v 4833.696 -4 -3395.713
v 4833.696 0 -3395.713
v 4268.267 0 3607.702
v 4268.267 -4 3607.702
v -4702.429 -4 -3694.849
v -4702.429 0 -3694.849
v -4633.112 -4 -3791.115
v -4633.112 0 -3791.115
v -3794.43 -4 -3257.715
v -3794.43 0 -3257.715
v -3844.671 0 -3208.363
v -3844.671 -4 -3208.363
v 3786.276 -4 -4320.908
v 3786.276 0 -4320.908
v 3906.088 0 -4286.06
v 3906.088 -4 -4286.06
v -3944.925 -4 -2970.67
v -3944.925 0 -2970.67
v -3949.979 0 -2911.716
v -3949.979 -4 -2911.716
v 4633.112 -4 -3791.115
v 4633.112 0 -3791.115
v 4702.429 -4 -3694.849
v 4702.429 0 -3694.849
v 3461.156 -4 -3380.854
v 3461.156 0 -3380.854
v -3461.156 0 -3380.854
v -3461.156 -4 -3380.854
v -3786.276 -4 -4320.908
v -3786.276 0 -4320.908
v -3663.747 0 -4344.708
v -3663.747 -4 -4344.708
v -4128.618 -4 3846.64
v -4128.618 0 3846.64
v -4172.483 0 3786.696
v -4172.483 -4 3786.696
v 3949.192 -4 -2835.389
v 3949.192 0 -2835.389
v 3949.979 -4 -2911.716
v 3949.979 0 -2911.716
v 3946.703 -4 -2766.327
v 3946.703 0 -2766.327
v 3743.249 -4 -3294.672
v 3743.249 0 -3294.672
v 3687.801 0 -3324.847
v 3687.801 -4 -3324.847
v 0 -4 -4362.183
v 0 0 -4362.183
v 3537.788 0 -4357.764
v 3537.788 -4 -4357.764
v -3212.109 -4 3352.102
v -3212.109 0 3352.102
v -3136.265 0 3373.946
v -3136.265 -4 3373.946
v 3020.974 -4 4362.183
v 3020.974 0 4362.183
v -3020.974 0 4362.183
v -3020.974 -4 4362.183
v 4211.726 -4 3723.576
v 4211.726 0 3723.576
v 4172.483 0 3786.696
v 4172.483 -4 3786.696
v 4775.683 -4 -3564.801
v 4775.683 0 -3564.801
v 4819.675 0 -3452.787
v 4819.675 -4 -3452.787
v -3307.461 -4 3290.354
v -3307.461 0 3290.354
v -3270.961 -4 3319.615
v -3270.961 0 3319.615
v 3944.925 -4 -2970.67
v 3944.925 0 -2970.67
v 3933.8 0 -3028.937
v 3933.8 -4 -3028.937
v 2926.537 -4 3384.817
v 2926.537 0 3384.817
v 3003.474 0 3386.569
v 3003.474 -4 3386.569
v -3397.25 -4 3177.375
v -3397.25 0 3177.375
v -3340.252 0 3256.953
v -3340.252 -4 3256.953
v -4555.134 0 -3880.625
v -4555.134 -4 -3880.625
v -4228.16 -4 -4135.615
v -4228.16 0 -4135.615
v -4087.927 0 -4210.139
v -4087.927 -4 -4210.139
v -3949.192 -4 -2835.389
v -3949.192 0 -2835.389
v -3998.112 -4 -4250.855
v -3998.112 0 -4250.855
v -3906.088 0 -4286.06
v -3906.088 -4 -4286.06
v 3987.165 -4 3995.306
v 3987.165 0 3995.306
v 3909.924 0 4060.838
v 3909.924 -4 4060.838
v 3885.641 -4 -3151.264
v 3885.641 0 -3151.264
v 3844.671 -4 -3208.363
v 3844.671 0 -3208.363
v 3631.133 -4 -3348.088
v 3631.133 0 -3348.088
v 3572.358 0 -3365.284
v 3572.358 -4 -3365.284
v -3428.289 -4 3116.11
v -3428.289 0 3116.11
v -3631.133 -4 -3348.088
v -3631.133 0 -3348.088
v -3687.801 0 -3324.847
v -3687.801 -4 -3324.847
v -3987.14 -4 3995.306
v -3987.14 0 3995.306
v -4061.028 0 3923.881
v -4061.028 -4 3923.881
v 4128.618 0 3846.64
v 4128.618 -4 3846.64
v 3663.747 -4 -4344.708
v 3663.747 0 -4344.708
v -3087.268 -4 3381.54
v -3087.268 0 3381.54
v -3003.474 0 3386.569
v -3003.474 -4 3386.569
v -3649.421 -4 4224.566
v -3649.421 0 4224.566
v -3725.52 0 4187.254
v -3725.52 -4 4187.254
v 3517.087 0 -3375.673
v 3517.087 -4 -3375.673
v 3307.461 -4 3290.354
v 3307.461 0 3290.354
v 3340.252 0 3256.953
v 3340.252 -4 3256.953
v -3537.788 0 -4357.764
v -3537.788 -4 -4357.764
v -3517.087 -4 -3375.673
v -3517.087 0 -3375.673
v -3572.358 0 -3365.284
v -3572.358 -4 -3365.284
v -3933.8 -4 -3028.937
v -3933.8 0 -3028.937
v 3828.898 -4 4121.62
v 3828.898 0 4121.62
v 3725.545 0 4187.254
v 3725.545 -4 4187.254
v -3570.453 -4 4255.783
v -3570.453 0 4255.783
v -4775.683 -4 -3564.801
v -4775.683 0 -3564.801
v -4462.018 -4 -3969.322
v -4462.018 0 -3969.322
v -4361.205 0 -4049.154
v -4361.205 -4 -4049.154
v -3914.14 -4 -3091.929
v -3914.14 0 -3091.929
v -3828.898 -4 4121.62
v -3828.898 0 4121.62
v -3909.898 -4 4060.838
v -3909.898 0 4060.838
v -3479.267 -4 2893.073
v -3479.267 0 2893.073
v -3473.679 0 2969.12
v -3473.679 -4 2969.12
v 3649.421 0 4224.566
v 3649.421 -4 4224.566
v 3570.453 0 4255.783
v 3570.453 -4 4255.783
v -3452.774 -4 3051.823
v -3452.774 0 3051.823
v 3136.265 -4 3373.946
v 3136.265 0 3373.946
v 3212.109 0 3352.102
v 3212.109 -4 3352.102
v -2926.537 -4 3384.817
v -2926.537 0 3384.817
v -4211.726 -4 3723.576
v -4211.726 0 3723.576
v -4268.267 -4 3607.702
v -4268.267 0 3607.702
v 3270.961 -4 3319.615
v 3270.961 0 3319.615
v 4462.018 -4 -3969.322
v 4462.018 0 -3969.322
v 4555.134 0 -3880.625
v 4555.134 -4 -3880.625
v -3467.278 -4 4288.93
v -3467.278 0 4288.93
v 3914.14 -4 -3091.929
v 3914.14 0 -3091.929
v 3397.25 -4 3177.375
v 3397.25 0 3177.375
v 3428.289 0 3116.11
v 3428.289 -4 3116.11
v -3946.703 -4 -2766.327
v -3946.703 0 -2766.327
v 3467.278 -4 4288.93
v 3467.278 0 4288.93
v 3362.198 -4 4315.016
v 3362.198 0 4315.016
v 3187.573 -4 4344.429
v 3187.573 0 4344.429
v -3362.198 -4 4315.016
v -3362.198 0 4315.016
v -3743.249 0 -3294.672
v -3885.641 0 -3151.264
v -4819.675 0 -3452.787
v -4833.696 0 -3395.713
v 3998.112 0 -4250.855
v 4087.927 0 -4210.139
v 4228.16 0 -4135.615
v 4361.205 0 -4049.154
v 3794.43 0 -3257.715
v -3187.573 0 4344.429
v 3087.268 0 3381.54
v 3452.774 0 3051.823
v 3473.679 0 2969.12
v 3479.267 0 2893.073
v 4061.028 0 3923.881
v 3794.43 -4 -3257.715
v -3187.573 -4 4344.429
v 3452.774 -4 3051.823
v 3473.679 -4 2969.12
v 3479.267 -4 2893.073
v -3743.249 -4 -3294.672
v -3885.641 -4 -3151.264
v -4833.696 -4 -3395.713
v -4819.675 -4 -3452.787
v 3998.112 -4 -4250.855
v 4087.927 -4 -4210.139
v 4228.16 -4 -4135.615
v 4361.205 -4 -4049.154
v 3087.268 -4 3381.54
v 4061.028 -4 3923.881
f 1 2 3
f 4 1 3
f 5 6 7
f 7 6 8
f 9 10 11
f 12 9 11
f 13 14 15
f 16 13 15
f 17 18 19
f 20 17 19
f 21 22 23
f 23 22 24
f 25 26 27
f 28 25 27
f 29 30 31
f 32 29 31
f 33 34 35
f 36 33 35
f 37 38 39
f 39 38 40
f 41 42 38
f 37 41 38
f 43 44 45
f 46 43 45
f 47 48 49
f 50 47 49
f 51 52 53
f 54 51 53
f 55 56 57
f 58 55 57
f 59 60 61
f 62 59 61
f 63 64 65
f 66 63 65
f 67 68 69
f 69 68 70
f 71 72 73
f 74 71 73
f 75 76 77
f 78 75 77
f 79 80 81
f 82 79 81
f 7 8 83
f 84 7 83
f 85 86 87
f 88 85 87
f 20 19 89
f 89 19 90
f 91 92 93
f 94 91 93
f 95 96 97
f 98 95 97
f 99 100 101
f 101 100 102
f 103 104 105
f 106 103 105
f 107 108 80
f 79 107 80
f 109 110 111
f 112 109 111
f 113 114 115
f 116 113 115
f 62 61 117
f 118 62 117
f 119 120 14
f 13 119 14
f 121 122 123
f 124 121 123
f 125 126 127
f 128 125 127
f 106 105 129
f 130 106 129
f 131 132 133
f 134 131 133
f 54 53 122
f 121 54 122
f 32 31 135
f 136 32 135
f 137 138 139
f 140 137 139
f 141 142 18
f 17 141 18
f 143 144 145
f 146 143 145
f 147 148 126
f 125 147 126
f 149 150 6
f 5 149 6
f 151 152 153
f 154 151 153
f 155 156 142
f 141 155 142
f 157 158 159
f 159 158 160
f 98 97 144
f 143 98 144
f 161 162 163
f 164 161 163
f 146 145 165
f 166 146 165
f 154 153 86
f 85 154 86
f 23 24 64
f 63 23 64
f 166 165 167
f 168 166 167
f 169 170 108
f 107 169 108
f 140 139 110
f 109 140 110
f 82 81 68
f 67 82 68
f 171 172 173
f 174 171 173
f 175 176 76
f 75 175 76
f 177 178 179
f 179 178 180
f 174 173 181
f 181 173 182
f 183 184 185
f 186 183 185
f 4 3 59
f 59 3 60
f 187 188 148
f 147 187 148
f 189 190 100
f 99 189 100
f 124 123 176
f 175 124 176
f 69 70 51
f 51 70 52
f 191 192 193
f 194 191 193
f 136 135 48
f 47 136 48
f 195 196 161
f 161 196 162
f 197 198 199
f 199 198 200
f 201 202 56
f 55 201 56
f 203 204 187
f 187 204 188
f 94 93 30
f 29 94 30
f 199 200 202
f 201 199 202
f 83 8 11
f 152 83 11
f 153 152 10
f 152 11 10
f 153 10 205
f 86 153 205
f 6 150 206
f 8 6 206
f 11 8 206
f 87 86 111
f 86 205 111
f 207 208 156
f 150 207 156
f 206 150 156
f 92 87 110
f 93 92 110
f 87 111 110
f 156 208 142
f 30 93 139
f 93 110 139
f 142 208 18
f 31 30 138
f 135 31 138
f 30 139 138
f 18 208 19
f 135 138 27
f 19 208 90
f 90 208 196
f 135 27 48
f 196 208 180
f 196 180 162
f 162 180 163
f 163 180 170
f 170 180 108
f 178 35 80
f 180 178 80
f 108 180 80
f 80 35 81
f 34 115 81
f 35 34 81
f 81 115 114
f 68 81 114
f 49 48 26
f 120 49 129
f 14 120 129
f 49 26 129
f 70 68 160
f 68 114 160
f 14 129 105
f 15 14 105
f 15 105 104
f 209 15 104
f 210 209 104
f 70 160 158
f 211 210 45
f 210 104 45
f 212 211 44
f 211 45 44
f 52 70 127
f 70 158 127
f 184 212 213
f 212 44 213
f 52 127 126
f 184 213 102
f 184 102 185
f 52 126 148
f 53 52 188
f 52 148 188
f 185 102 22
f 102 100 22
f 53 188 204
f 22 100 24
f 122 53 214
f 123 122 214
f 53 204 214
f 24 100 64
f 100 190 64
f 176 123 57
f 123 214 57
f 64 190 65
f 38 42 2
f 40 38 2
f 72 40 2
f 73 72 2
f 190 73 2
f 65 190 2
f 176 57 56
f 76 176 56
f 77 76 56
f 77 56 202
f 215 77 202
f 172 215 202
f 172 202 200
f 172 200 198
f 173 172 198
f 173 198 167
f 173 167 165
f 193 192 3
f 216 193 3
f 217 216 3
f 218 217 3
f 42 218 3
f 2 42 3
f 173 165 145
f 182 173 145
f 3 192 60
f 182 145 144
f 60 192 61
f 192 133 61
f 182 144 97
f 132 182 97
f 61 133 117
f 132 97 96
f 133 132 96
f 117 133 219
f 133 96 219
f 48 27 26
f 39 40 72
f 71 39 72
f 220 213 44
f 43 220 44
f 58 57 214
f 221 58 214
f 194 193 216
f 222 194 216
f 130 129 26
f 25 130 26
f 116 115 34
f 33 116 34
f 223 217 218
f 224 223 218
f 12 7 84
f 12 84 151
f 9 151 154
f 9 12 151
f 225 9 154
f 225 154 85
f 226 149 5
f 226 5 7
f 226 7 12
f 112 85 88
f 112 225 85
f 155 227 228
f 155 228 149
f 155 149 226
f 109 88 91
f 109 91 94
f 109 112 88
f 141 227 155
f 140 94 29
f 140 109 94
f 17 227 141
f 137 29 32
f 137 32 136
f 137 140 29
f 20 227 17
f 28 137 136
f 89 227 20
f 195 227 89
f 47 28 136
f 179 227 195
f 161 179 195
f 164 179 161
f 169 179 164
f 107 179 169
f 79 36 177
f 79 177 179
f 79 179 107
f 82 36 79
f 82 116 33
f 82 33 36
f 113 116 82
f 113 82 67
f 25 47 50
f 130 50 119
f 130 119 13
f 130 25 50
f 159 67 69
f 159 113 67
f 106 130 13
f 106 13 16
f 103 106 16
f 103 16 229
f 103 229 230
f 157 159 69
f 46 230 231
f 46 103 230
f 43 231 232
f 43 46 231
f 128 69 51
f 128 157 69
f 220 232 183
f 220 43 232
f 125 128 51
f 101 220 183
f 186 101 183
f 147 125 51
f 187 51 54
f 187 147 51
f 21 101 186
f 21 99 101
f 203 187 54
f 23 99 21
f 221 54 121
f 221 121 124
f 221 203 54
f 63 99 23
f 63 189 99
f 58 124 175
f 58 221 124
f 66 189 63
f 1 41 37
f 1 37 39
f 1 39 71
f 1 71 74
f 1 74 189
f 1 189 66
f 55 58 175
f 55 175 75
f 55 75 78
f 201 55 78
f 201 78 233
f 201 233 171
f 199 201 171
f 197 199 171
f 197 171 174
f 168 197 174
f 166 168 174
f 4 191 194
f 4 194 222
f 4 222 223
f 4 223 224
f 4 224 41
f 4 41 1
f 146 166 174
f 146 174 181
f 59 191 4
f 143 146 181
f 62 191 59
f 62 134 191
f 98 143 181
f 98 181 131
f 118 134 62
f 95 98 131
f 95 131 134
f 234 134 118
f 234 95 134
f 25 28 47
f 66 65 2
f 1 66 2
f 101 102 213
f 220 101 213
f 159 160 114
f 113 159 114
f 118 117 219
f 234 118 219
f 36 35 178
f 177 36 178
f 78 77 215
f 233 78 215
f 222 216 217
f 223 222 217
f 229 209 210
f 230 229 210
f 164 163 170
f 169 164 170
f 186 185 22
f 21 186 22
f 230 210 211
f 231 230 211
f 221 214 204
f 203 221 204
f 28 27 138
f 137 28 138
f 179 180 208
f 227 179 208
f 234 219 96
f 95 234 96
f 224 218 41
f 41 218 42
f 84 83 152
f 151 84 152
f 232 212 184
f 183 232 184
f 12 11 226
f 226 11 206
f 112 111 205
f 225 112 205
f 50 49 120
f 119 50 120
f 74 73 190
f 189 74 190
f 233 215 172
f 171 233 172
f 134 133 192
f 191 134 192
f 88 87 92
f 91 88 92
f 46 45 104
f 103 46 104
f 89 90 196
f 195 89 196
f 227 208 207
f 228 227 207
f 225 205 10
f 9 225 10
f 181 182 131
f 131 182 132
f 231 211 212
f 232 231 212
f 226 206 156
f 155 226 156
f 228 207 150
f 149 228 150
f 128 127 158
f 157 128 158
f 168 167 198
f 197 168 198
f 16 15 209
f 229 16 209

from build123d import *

# Parameters (mm, degrees)
F1_DEPTH = 4


with BuildPart() as f1:
    # F0 (on Front) → F1 (new body)
    with BuildSketch(Plane.XZ):
        Polygon((1097.0768, 3384.8167), (0, 3384.8167), (-1097.0768, 3384.8167), (-2926.5372, 3384.8167), (-3003.4738, 3386.5693), (-3087.2684, 3381.5401), (-3136.265, 3373.9455), (-3212.1094, 3352.1015), (-3270.9612, 3319.6149), (-3307.461, 3290.3541), (-3340.2524, 3256.9531), (-3397.25, 3177.3749), (-3428.2888, 3116.1101), (-3452.7744, 3051.8227), (-3473.6786, 2969.1203), (-3479.2666, 2893.0727), (-3946.7028, -2766.3267), (-3949.192, -2835.3893), (-3949.9794, -2911.7163), (-3944.9248, -2970.6697), (-3933.7996, -3028.9373), (-3914.14, -3091.9293), (-3885.6412, -3151.2637), (-3844.671, -3208.3629), (-3794.4298, -3257.7151), (-3743.2488, -3294.6721), (-3687.8006, -3324.8473), (-3631.1332, -3348.0883), (-3572.3576, -3365.2841), (-3517.0872, -3375.6727), (-3461.1564, -3380.8543), (0, -3380.8543), (3461.1564, -3380.8543), (3517.0872, -3375.6727), (3572.3576, -3365.2841), (3631.1332, -3348.0883), (3687.8006, -3324.8473), (3743.2488, -3294.6721), (3794.4298, -3257.7151), (3844.671, -3208.3629), (3885.6412, -3151.2637), (3914.14, -3091.9293), (3933.7996, -3028.9373), (3944.9248, -2970.6697), (3949.9794, -2911.7163), (3949.192, -2835.3893), (3946.7028, -2766.3267), (3479.2666, 2893.0727), (3473.6786, 2969.1203), (3452.7744, 3051.8227), (3428.2888, 3116.1101), (3397.25, 3177.3749), (3340.2524, 3256.9531), (3307.461, 3290.3541), (3270.9612, 3319.6149), (3212.1094, 3352.1015), (3136.265, 3373.9455), (3087.2684, 3381.5401), (3003.4738, 3386.5693), (2926.5372, 3384.8167), align=None)
        Polygon((1600.5556, 4362.1833), (0, 4362.1833), (-1600.5556, 4362.1833), (-3020.9744, 4362.1833), (-3187.573, 4344.4287), (-3362.198, 4315.0155), (-3467.2778, 4288.9297), (-3570.4526, 4255.7827), (-3649.4212, 4224.5661), (-3725.5196, 4187.2535), (-3828.8976, 4121.6199), (-3909.8982, 4060.8377), (-3987.1396, 3995.3057), (-4061.0282, 3923.8809), (-4128.6176, 3846.6395), (-4172.4834, 3786.6955), (-4211.7264, 3723.5765), (-4268.2668, 3607.7017), (-4833.6962, -3395.7133), (-4819.6754, -3452.7871), (-4775.6826, -3564.8011), (-4702.429, -3694.8491), (-4633.1124, -3791.1151), (-4555.1344, -3880.6247), (-4462.018, -3969.3215), (-4361.2054, -4049.1537), (-4228.1602, -4135.6153), (-4087.9268, -4210.1389), (-3998.1124, -4250.8551), (-3906.0882, -4286.0595), (-3786.2764, -4320.9083), (-3663.7468, -4344.7081), (-3537.7882, -4357.7637), (0, -4362.1833), (3537.7882, -4357.7637), (3663.7468, -4344.7081), (3786.2764, -4320.9083), (3906.0882, -4286.0595), (3998.1124, -4250.8551), (4087.9268, -4210.1389), (4228.1602, -4135.6153), (4361.2054, -4049.1537), (4462.018, -3969.3215), (4555.1344, -3880.6247), (4633.1124, -3791.1151), (4702.429, -3694.8491), (4775.6826, -3564.8011), (4819.6754, -3452.7871), (4833.6962, -3395.7133), (4268.2668, 3607.7017), (4211.7264, 3723.5765), (4172.4834, 3786.6955), (4128.6176, 3846.6395), (4061.0282, 3923.8809), (3987.165, 3995.3057), (3909.9236, 4060.8377), (3828.8976, 4121.6199), (3725.545, 4187.2535), (3649.4212, 4224.5661), (3570.4526, 4255.7827), (3467.2778, 4288.9297), (3362.198, 4315.0155), (3187.573, 4344.4287), (3020.9744, 4362.1833), align=None)
        Polygon((-1097.0768, 3384.8167), (0, 3384.8167), (1097.0768, 3384.8167), (2926.5372, 3384.8167), (3003.4738, 3386.5693), (3087.2684, 3381.5401), (3136.265, 3373.9455), (3212.1094, 3352.1015), (3270.9612, 3319.6149), (3307.461, 3290.3541), (3340.2524, 3256.9531), (3397.25, 3177.3749), (3428.2888, 3116.1101), (3452.7744, 3051.8227), (3473.6786, 2969.1203), (3479.2666, 2893.0727), (3946.7028, -2766.3267), (3949.192, -2835.3893), (3949.9794, -2911.7163), (3944.9248, -2970.6697), (3933.7996, -3028.9373), (3914.14, -3091.9293), (3885.6412, -3151.2637), (3844.671, -3208.3629), (3794.4298, -3257.7151), (3743.2488, -3294.6721), (3687.8006, -3324.8473), (3631.1332, -3348.0883), (3572.3576, -3365.2841), (3517.0872, -3375.6727), (3461.1564, -3380.8543), (0, -3380.8543), (-3461.1564, -3380.8543), (-3517.0872, -3375.6727), (-3572.3576, -3365.2841), (-3631.1332, -3348.0883), (-3687.8006, -3324.8473), (-3743.2488, -3294.6721), (-3794.4298, -3257.7151), (-3844.671, -3208.3629), (-3885.6412, -3151.2637), (-3914.14, -3091.9293), (-3933.7996, -3028.9373), (-3944.9248, -2970.6697), (-3949.9794, -2911.7163), (-3949.192, -2835.3893), (-3946.7028, -2766.3267), (-3479.2666, 2893.0727), (-3473.6786, 2969.1203), (-3452.7744, 3051.8227), (-3428.2888, 3116.1101), (-3397.25, 3177.3749), (-3340.2524, 3256.9531), (-3307.461, 3290.3541), (-3270.9612, 3319.6149), (-3212.1094, 3352.1015), (-3136.265, 3373.9455), (-3087.2684, 3381.5401), (-3003.4738, 3386.5693), (-2926.5372, 3384.8167), align=None, mode=Mode.SUBTRACT)
    extrude(amount=F1_DEPTH)


solid = f1.part
